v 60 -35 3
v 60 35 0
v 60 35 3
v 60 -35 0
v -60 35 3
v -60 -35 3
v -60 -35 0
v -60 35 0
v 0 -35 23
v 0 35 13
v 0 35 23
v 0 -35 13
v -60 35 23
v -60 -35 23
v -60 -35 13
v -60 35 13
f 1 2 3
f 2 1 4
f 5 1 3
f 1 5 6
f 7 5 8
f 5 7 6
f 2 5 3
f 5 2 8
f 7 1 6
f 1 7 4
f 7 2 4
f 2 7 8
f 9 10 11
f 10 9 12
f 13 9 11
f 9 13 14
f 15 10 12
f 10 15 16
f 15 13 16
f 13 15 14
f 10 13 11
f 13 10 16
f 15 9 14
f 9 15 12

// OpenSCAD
// Built by bench/smallmodels/features/compiler.py from a list of features.
$fn = 64;
difference() {
  union() {
    translate([0, 0, 0]) translate([-60, -35, 0]) cube([120, 70, 40]);
  }
  union() {
    translate([0, 0, 3]) rotate([0, 0, 0]) translate([-60, -35, 0]) cube([120, 70, 37]);
    translate([0, 0, -3]) rotate([0, 0, 0]) translate([-60, -35, 0]) cube([120, 70, 3]);
  }
}
union() {
    translate([-30, 0, 13]) translate([-30, -35, 0]) cube([60, 70, 10]);
  }
